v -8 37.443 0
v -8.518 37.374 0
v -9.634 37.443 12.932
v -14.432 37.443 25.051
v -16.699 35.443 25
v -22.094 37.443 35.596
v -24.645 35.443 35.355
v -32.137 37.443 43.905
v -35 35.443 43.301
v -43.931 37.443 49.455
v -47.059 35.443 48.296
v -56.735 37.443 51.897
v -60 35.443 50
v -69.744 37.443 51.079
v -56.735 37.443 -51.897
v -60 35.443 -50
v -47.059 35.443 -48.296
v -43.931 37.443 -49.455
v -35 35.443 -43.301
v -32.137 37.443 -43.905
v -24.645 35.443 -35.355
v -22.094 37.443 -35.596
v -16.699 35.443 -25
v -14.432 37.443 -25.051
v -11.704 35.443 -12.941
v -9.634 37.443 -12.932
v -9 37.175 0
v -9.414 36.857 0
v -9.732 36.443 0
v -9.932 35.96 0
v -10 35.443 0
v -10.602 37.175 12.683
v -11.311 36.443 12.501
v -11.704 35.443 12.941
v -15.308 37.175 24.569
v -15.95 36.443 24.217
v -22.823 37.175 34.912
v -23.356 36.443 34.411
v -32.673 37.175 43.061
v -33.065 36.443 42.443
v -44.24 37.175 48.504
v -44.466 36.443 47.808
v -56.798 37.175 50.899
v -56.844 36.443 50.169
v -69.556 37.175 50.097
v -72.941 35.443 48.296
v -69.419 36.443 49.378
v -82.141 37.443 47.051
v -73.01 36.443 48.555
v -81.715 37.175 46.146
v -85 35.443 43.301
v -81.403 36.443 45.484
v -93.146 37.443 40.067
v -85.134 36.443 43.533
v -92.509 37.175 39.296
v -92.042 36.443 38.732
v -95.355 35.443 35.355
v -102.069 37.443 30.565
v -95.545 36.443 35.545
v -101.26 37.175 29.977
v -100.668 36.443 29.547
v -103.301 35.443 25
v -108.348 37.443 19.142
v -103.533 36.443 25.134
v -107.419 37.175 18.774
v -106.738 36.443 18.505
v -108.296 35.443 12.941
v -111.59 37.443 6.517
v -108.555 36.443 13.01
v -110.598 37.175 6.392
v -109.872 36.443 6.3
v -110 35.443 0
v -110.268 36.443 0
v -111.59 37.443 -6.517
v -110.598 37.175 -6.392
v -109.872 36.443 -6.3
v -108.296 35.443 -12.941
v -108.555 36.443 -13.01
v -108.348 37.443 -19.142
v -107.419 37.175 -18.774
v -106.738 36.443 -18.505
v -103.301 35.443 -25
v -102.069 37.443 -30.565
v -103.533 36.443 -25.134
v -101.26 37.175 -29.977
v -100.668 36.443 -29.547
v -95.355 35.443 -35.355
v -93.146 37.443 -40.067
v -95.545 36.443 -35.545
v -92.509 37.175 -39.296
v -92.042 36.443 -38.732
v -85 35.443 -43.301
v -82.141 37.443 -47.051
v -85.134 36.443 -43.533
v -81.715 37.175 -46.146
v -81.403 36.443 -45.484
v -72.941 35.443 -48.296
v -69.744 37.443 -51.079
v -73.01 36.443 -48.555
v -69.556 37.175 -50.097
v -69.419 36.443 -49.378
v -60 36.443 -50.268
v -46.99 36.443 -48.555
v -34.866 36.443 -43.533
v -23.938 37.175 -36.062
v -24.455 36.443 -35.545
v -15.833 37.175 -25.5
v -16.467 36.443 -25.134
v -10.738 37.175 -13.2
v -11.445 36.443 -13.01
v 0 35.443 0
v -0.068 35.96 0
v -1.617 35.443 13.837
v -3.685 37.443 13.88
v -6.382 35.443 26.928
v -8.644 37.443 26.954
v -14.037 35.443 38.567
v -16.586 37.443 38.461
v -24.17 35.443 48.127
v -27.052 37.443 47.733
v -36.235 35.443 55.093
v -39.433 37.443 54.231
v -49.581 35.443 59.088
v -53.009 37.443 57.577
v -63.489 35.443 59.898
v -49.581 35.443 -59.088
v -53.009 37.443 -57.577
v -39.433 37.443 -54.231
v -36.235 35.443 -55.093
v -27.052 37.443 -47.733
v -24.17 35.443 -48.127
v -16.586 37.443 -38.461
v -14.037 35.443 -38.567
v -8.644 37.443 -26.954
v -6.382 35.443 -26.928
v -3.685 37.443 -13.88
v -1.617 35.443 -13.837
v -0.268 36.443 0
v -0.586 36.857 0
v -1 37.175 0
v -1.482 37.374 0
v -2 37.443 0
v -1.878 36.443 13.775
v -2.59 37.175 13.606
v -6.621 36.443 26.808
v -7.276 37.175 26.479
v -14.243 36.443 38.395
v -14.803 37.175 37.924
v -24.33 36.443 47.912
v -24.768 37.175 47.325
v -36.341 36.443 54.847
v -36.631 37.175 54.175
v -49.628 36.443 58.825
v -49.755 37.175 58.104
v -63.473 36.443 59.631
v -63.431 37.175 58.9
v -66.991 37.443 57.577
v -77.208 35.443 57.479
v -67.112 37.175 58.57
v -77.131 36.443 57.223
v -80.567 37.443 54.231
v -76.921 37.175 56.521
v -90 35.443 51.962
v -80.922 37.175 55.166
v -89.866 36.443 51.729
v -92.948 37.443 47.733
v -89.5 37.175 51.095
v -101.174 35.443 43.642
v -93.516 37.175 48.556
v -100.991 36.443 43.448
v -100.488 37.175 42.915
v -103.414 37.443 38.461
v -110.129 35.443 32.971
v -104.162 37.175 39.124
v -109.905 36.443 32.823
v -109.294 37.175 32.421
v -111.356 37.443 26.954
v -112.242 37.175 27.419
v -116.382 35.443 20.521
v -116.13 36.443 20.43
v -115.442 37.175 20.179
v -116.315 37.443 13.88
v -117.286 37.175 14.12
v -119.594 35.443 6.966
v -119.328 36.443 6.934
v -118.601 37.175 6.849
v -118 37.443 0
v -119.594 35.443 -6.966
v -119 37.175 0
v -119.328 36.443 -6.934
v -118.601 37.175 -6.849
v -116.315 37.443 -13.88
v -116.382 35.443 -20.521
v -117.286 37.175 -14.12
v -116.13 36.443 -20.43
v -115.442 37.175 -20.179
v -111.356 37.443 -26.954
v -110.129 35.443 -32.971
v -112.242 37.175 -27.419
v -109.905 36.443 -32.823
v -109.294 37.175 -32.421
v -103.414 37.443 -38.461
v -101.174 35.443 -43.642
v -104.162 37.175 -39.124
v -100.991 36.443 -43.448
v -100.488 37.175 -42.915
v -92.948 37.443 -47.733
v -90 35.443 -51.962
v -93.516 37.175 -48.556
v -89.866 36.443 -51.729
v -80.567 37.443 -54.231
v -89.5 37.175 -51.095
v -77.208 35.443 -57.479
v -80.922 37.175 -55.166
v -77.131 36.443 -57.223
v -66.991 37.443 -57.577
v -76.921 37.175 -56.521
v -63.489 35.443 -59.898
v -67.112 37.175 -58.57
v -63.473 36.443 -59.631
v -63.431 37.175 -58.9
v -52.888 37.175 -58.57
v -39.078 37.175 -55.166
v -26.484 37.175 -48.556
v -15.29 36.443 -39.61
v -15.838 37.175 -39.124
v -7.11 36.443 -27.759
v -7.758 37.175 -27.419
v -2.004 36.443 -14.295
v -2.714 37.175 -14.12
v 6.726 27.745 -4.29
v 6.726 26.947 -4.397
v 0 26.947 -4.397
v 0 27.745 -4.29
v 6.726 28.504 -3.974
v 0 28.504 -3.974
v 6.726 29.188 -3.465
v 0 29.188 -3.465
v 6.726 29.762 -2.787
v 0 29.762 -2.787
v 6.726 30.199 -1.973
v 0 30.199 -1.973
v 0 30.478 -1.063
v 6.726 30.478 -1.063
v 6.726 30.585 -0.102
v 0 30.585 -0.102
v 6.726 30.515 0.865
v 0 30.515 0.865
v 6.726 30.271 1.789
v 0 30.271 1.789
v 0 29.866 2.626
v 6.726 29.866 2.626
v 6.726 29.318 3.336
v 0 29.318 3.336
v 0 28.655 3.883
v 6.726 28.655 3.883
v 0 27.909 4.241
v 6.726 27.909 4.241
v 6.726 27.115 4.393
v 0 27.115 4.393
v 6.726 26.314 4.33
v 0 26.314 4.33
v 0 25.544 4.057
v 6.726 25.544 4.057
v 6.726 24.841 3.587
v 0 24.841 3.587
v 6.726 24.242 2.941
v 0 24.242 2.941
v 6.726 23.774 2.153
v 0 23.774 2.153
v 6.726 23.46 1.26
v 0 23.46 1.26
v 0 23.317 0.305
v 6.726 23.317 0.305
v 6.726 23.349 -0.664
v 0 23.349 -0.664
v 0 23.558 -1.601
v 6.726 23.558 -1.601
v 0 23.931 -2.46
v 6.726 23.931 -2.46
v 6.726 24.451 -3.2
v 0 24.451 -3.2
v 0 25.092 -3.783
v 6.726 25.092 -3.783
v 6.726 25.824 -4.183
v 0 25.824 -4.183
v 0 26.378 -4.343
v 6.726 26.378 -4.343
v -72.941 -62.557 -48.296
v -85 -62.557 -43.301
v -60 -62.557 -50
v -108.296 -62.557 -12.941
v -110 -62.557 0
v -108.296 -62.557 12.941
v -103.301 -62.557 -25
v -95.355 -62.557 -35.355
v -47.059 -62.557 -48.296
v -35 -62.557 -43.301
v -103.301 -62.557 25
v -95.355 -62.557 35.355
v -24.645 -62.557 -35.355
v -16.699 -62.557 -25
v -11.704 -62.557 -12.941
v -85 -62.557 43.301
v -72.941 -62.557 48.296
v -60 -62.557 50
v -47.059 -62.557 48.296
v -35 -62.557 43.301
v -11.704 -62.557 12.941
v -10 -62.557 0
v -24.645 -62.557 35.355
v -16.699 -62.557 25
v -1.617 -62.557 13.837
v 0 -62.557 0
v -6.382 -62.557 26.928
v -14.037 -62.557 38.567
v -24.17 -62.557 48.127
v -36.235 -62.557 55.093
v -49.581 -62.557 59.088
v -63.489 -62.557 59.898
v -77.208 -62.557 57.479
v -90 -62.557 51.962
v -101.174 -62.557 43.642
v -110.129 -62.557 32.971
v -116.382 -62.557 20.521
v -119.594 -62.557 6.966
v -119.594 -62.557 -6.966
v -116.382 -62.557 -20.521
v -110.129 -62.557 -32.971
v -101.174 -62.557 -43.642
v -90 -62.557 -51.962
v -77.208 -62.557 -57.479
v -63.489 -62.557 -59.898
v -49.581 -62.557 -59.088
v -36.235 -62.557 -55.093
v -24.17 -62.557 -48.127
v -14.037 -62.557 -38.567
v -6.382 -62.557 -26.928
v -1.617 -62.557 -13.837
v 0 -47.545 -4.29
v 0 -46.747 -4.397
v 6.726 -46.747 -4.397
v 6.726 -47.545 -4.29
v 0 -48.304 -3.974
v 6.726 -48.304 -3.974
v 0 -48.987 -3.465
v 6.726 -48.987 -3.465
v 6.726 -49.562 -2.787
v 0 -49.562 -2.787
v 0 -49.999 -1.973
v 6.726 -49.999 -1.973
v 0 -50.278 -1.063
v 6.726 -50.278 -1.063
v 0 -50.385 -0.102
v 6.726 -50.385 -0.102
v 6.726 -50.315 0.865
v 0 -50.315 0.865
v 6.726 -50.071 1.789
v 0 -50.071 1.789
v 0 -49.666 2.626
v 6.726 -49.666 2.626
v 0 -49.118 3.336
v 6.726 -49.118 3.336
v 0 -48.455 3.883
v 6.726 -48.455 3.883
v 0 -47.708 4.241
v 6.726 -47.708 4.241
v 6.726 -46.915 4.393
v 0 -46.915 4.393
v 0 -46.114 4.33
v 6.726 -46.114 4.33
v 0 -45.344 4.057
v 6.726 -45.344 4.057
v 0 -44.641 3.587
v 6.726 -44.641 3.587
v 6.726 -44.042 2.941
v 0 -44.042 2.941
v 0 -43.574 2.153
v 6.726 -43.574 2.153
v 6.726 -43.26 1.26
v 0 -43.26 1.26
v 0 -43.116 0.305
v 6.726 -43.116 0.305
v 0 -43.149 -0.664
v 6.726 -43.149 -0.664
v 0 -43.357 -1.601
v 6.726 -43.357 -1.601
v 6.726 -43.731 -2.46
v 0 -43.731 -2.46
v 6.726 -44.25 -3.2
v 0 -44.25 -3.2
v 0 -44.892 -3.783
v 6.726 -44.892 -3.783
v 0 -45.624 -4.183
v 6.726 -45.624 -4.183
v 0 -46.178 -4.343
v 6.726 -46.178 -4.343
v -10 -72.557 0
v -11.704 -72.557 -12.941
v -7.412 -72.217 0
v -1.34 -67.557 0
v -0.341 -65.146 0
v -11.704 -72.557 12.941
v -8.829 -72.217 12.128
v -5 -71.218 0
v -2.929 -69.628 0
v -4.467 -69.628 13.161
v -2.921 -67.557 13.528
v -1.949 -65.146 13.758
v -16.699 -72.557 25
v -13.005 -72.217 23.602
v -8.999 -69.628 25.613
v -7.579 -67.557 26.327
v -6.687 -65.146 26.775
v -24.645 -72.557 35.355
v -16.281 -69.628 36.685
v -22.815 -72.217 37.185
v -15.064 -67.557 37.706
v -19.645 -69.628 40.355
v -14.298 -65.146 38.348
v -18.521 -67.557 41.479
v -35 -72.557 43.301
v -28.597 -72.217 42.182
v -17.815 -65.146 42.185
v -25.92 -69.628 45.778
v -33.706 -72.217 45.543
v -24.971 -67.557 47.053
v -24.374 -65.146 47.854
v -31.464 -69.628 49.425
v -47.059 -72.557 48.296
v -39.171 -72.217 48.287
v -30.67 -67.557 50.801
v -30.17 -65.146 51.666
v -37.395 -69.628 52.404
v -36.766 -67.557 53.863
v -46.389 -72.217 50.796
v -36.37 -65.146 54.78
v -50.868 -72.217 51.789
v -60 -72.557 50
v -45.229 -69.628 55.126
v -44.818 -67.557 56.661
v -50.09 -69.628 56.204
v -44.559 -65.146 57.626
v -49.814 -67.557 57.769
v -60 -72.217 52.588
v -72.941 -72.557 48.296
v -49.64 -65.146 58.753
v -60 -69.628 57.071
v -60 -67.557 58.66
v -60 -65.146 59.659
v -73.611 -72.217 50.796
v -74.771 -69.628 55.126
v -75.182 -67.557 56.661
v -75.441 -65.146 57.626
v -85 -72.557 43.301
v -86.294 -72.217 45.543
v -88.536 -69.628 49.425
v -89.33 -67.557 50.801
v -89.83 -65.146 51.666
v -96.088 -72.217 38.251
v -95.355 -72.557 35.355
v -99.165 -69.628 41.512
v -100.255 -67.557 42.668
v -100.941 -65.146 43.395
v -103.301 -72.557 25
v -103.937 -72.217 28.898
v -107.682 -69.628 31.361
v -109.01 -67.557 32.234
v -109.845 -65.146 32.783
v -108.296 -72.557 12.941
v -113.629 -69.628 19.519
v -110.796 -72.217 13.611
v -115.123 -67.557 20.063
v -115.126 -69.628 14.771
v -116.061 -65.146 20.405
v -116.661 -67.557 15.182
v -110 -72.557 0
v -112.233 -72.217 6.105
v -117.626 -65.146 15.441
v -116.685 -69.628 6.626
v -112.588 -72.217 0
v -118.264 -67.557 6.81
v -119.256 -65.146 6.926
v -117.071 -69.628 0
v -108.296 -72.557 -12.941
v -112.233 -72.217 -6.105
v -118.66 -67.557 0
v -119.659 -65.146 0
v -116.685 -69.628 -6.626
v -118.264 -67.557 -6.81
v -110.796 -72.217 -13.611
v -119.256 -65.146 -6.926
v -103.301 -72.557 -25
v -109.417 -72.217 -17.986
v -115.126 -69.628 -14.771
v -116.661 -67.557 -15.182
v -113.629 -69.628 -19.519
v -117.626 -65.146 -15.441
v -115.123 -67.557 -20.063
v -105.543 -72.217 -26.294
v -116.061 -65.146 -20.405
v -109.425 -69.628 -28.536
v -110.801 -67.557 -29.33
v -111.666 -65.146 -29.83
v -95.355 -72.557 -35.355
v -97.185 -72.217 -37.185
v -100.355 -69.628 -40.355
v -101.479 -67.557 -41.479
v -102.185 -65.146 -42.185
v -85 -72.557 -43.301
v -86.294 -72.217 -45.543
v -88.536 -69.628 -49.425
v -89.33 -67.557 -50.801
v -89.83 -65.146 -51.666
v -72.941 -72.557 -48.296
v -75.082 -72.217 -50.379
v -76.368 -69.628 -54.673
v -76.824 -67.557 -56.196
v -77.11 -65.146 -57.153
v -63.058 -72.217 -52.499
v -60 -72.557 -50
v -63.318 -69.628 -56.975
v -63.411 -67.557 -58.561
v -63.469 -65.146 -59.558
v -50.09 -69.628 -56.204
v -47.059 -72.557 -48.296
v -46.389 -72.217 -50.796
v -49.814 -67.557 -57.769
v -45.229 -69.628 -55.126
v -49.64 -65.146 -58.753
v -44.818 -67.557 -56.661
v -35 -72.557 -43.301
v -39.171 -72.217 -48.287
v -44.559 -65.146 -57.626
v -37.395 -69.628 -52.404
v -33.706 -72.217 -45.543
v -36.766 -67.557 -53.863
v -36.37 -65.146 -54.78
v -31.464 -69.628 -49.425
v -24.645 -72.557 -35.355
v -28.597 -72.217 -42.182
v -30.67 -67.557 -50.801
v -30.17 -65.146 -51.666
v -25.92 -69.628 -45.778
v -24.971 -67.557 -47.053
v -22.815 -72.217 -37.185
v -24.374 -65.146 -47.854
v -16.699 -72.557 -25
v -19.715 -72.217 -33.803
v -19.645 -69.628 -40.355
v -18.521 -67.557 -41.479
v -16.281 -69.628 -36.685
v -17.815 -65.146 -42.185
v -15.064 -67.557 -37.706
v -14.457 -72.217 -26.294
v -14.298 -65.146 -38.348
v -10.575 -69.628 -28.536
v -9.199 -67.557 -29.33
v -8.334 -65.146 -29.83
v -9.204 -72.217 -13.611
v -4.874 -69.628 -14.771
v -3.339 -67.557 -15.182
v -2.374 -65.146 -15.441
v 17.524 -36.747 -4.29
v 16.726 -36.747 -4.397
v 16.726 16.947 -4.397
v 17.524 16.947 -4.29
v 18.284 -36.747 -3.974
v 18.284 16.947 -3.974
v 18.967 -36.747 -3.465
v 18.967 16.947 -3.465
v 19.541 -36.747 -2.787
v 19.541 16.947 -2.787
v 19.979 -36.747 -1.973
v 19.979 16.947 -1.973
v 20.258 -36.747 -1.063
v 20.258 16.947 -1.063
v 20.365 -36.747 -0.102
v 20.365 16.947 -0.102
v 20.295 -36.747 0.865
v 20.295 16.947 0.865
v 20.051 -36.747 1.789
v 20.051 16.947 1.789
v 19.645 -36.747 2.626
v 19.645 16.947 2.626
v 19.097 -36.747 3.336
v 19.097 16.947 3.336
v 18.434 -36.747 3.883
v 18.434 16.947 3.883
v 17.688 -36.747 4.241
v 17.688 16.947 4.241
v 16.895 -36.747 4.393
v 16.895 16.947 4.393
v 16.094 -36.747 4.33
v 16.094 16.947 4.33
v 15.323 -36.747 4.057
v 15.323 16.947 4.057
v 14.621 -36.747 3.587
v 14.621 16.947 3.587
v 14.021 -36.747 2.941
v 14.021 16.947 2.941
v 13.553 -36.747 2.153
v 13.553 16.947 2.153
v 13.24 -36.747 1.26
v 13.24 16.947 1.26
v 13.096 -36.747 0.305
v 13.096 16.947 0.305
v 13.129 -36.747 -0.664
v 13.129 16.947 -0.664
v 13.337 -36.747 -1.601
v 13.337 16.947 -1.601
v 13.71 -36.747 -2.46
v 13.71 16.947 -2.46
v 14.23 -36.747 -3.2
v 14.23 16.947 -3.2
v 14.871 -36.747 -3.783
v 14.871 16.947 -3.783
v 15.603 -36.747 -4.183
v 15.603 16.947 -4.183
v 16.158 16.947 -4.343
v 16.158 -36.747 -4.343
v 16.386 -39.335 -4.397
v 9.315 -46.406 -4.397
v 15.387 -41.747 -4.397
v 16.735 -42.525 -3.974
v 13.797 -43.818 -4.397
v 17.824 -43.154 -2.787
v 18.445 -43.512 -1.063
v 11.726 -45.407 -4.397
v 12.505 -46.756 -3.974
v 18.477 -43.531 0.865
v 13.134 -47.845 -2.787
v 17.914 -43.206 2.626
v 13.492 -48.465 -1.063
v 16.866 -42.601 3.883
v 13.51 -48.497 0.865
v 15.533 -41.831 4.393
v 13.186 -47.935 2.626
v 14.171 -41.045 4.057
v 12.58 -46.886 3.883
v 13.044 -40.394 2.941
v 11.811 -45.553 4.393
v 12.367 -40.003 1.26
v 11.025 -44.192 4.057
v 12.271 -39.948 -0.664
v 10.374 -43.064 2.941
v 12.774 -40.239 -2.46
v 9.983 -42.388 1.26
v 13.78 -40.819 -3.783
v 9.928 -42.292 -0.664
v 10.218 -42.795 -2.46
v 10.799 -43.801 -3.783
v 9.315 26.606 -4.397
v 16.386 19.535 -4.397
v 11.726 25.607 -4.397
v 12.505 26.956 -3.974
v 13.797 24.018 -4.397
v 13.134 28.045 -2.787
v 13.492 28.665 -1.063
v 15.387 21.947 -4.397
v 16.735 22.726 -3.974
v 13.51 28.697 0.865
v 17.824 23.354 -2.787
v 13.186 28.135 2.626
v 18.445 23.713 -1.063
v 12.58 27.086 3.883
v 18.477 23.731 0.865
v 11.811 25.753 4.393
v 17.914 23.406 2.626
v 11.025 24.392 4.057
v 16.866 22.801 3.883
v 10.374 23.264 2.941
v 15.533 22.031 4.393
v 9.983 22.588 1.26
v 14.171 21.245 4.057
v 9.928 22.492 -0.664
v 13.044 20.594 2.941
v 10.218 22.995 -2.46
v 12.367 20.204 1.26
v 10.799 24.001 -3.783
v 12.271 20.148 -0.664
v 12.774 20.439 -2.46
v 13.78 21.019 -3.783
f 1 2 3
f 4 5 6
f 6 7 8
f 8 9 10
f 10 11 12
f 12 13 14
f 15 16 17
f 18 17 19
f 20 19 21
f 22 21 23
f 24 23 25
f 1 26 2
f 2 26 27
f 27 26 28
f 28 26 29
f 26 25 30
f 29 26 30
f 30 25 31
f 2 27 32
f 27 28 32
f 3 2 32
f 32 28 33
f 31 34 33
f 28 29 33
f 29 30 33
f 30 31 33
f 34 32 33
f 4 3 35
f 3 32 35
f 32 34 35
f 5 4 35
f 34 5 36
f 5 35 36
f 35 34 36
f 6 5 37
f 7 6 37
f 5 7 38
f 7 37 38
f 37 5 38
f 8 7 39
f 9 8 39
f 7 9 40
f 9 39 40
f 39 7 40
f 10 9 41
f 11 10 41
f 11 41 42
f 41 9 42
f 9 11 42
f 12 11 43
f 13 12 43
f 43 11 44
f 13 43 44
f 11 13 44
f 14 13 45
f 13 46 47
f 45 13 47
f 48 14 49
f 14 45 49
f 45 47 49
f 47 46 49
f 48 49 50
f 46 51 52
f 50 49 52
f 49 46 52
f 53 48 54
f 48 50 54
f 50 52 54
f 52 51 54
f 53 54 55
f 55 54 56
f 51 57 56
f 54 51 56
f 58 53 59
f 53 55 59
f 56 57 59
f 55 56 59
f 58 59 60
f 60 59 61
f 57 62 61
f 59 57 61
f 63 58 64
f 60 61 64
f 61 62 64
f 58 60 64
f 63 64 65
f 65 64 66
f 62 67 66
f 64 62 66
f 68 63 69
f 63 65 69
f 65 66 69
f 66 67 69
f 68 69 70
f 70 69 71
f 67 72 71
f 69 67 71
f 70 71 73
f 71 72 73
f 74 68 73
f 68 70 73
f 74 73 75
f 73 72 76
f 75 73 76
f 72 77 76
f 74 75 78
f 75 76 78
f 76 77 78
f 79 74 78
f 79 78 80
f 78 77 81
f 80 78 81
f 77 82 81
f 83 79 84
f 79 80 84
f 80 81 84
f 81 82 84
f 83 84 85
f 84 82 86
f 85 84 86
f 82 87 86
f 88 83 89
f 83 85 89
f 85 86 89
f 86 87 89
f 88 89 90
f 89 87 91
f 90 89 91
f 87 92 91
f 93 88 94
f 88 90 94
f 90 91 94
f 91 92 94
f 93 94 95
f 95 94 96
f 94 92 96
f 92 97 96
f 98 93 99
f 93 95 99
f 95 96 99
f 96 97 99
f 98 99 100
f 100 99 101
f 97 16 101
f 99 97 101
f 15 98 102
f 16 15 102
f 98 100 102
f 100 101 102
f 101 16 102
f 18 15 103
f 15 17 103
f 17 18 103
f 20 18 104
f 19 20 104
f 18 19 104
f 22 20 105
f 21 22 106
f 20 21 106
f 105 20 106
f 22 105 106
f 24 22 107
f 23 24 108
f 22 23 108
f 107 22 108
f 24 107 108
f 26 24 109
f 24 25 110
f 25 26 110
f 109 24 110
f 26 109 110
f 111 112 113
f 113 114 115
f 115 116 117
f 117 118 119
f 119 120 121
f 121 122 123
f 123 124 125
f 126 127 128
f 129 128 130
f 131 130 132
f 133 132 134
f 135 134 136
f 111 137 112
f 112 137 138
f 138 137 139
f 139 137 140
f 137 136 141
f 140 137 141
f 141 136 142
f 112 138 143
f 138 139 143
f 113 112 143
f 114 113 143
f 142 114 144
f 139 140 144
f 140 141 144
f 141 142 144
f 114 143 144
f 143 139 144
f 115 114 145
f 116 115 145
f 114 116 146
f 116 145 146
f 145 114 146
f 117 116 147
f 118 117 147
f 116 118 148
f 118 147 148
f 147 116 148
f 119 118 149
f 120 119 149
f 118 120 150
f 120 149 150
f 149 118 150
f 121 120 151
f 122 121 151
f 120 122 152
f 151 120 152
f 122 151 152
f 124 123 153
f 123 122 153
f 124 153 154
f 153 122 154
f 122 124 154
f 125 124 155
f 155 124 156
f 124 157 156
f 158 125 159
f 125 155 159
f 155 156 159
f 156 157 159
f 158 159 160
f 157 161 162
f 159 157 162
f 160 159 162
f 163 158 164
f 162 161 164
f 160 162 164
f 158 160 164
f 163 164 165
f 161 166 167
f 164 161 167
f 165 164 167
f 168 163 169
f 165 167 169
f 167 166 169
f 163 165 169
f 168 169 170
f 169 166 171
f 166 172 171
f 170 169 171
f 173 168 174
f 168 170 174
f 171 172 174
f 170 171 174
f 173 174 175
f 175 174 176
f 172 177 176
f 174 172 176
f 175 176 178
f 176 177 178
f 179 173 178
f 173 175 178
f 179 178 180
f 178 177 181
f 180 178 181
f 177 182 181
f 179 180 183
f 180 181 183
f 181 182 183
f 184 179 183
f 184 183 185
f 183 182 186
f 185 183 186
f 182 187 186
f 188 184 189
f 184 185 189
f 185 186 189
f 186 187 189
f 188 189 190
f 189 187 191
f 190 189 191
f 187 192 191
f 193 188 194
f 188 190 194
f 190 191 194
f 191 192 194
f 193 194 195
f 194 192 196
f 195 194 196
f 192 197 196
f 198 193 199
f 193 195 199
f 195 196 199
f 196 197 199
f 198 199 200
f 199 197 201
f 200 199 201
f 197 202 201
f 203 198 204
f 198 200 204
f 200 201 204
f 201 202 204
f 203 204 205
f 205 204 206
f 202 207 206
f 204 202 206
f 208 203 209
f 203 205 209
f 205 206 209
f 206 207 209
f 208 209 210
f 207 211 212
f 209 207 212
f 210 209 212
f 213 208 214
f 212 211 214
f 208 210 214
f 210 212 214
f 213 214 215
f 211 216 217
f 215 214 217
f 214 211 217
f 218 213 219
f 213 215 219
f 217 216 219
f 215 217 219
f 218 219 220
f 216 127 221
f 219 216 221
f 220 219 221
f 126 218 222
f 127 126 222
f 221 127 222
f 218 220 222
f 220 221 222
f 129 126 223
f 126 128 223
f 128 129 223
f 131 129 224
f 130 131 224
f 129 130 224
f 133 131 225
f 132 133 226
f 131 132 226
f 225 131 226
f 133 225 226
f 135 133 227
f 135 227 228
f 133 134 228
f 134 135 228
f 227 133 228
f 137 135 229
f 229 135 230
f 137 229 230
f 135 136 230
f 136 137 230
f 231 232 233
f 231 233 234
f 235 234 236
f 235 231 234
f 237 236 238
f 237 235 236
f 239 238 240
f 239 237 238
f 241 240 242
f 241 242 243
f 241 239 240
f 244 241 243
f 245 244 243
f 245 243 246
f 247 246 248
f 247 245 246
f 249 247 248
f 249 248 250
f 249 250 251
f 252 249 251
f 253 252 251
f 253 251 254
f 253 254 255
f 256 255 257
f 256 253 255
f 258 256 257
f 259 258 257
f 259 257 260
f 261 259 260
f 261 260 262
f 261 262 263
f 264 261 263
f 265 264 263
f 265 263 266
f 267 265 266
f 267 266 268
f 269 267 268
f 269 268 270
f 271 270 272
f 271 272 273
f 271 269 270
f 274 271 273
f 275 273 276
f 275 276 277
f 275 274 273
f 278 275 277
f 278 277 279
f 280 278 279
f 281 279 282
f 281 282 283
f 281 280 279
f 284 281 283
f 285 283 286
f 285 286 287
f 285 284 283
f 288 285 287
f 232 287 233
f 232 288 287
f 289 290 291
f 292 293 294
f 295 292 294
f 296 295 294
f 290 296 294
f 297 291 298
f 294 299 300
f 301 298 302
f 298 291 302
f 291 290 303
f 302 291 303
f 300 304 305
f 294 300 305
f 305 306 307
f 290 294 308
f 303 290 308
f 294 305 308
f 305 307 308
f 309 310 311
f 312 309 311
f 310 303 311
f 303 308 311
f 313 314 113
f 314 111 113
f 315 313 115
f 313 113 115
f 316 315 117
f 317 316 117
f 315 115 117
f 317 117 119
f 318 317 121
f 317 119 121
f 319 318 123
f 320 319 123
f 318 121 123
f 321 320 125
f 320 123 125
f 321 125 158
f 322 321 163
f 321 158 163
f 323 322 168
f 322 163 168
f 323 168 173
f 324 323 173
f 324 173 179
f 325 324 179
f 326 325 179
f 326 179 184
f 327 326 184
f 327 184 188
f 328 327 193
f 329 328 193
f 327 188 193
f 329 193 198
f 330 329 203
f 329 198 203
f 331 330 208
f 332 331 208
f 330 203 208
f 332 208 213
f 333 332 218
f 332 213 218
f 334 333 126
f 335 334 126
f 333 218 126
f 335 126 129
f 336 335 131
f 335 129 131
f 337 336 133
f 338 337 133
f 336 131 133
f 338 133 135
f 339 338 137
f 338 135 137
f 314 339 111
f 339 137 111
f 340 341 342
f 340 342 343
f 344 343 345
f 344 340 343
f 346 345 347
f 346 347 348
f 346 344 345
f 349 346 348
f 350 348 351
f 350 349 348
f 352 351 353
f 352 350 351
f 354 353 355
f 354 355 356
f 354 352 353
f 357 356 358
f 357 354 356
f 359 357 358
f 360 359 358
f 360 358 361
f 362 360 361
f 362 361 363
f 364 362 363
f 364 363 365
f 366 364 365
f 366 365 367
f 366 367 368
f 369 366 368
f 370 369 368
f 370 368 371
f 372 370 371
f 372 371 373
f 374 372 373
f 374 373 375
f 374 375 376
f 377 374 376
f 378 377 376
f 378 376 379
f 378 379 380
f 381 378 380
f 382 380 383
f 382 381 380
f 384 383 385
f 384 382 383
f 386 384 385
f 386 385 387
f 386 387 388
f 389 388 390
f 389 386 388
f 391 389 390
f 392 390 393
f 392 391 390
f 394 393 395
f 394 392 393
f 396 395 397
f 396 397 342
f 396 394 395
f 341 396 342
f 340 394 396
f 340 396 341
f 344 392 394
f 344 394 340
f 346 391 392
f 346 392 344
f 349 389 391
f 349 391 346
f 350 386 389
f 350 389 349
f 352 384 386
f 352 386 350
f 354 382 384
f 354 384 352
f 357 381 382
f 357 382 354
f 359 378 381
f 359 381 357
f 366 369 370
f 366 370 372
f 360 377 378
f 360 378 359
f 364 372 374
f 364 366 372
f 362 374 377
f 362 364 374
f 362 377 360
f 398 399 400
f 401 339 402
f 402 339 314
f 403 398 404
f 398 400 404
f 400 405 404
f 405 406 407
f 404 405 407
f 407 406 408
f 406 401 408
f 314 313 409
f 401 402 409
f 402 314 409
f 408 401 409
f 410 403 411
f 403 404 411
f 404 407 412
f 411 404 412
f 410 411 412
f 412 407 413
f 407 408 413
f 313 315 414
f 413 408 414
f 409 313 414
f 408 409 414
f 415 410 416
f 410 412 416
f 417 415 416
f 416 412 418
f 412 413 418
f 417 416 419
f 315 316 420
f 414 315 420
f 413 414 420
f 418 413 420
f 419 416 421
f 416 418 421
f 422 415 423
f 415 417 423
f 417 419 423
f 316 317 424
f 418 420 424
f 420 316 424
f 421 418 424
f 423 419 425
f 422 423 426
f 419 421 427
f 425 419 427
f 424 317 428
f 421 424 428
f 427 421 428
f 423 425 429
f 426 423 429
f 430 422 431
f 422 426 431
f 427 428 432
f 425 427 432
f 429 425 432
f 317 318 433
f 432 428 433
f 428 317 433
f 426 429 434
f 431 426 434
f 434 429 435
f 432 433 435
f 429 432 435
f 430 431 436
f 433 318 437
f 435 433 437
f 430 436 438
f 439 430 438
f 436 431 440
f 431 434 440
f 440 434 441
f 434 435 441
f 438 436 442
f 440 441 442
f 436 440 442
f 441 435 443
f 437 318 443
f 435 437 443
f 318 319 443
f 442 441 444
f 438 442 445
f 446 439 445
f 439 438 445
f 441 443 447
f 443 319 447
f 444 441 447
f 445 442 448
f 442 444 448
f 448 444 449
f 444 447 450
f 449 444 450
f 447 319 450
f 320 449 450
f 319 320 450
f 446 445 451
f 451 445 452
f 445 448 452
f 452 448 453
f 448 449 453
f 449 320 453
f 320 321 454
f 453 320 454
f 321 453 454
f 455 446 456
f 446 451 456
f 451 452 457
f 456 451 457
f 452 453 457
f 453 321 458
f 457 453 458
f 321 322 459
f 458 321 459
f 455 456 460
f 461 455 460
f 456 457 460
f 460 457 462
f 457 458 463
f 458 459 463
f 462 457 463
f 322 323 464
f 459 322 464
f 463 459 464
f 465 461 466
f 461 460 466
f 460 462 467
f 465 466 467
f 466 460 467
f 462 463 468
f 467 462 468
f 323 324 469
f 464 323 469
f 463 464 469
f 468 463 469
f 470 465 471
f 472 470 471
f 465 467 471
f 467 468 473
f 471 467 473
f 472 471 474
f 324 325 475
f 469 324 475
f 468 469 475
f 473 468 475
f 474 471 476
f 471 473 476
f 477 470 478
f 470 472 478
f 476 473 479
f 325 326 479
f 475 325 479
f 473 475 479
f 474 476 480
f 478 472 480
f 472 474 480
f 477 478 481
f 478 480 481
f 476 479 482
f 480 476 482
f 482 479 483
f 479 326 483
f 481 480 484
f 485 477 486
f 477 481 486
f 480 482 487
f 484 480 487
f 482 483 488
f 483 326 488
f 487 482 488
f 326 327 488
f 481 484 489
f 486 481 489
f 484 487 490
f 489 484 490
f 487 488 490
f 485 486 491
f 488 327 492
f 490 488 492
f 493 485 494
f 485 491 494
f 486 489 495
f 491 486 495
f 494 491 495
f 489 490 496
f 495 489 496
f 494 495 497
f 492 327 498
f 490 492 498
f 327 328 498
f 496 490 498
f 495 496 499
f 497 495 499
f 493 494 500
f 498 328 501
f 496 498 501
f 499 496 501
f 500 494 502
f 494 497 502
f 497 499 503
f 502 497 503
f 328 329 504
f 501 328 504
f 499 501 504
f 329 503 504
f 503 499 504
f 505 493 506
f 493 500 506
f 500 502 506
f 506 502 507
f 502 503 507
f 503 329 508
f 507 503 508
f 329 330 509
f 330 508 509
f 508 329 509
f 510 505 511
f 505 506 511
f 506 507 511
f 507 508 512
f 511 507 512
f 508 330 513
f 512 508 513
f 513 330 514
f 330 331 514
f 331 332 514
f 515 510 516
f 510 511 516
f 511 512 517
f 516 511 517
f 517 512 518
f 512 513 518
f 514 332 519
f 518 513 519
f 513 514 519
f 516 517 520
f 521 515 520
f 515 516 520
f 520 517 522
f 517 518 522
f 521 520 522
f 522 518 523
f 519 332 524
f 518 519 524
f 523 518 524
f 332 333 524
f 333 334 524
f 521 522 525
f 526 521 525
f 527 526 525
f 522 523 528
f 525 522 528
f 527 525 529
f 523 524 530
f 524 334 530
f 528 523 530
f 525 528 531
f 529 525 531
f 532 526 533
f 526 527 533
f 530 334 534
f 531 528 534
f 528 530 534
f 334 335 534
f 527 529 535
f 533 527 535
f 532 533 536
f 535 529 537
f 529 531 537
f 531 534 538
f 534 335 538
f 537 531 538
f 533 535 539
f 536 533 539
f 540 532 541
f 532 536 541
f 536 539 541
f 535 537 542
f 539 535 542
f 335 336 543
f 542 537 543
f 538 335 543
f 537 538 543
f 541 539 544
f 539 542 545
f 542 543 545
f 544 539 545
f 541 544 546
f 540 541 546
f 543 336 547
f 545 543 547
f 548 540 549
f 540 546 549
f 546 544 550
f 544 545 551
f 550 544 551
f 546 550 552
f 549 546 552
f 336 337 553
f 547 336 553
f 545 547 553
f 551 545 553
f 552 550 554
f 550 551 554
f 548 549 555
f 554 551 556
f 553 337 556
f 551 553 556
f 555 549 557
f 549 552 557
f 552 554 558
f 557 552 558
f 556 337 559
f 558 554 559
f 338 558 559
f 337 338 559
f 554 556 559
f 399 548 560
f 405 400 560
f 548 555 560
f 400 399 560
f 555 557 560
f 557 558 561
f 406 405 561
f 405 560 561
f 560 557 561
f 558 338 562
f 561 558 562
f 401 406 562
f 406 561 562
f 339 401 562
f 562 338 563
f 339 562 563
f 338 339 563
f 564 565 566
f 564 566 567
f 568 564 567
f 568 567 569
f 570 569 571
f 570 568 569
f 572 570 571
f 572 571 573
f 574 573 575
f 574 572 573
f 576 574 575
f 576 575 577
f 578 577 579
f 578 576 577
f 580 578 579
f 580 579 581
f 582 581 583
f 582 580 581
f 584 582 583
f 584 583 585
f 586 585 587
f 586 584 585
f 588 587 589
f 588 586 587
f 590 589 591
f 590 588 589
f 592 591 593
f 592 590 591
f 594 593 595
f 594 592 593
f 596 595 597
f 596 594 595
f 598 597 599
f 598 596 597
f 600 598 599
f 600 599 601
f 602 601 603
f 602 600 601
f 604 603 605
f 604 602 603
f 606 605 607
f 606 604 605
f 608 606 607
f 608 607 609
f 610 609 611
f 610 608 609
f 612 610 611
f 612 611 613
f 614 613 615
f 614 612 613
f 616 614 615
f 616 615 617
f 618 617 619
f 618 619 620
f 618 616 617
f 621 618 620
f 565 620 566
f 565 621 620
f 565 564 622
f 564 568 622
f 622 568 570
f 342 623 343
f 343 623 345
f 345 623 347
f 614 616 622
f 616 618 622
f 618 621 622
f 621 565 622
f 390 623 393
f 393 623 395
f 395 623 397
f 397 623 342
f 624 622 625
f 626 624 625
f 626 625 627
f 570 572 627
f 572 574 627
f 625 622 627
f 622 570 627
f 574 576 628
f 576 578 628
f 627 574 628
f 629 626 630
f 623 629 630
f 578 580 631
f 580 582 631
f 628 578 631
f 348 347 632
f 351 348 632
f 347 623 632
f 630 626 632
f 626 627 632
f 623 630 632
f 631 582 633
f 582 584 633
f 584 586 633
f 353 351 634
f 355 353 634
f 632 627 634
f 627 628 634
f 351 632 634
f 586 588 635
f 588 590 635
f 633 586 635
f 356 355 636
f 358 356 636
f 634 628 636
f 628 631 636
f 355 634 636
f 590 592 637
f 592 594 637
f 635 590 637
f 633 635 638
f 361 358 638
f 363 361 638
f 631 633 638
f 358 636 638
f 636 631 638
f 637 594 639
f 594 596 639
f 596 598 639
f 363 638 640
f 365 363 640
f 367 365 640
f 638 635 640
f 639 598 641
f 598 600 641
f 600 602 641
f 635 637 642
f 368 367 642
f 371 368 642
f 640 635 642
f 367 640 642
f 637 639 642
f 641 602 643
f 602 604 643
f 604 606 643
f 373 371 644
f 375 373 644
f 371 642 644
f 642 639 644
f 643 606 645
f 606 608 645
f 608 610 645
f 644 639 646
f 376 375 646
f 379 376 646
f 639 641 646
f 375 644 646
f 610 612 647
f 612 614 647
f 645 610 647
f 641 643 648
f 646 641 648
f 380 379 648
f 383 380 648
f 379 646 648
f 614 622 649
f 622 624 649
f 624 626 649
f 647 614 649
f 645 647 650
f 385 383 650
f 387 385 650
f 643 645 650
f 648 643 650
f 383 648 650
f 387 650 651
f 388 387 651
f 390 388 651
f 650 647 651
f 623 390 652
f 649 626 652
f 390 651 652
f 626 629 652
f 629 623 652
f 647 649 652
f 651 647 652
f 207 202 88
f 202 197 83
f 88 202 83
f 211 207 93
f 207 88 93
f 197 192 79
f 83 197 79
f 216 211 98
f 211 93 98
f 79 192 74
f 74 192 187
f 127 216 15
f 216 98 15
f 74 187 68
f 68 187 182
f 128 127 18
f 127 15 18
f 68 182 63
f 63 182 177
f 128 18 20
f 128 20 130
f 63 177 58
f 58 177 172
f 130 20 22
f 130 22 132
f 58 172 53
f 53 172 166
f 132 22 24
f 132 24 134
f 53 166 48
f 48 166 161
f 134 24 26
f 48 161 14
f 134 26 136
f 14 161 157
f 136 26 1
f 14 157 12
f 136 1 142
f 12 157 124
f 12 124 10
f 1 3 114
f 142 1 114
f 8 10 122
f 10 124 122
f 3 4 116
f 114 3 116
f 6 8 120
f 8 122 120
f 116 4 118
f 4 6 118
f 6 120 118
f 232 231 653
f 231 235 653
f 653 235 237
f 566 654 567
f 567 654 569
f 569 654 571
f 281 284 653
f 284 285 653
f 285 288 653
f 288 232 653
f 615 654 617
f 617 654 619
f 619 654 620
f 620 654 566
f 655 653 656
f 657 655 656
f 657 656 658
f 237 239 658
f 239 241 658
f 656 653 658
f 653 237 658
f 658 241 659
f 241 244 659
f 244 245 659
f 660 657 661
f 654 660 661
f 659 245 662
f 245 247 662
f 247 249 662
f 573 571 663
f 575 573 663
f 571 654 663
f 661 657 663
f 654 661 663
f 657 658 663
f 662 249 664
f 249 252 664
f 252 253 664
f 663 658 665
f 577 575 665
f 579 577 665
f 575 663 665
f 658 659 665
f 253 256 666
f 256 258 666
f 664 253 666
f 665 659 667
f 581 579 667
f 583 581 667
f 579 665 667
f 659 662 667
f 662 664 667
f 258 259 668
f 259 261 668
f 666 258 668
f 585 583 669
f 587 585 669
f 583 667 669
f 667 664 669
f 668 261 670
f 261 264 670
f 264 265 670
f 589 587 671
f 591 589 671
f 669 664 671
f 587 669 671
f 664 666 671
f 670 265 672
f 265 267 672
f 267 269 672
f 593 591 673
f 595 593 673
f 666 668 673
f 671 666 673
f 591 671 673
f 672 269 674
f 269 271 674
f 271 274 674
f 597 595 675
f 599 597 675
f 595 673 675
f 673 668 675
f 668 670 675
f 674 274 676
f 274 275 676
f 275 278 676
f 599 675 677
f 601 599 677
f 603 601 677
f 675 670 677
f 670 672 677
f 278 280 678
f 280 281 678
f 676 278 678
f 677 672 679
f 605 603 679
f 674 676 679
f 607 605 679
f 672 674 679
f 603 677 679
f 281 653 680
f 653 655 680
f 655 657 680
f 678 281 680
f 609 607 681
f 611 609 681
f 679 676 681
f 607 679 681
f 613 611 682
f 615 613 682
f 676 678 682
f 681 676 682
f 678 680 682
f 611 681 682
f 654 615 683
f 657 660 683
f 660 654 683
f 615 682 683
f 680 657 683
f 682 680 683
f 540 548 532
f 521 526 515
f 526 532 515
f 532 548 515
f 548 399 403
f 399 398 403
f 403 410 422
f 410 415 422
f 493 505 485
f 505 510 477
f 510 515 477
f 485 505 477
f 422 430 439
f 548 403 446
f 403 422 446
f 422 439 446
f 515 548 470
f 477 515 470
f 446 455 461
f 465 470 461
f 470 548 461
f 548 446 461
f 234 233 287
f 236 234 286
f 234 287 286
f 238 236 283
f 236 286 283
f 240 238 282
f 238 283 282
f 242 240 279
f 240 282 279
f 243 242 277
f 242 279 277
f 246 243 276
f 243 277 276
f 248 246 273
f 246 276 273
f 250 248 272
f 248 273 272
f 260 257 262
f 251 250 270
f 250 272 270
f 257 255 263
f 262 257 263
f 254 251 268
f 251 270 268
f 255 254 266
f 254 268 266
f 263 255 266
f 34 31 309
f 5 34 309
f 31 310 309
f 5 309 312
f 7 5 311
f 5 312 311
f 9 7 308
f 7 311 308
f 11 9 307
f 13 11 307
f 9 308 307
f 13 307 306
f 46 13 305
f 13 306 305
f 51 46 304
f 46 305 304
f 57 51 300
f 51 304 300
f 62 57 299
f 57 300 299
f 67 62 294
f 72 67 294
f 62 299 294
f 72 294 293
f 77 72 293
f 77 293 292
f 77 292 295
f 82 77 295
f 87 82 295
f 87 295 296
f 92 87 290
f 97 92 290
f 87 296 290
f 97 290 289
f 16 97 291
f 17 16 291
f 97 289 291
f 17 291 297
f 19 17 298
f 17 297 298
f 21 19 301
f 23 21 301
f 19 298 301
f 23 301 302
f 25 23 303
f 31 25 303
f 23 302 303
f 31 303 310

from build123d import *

# Parameters (mm, degrees)
SKETCH8_RX = 4.397360636
SKETCH8_RY = 3.639195009


with BuildPart() as part:
    # Sketch6 → Revolve7 (revolve)
    with BuildSketch(Plane.XY):
        with BuildLine():
            Line((0, 0), (0, 35.442595339))
            ThreePointArc((0, 35.442595339), (-0.585786438, 36.856808901), (-2, 37.442595339))
            Line((-2, 37.442595339), (-8, 37.442595339))
            ThreePointArc((-8, 37.442595339), (-9.414213562, 36.856808901), (-10, 35.442595339))
            Line((-10, 35.442595339), (-10, -62.557404661))
            Line((-10, -62.557404661), (-60, -62.557404661))
            Line((-60, -62.557404661), (-60, -72.557404661))
            Line((-60, -72.557404661), (-10, -72.557404661))
            ThreePointArc((-10, -72.557404661), (-2.928932188, -69.628472473), (0, -62.557404661))
            Line((0, -62.557404661), (0, 0))
        make_face()
    revolve(axis=Axis((-60, 37.442595339, 0), (0, -1, 0)))


with BuildPart() as body_2:
    # Sweep4: sweep along a path in Sketch10
    with BuildLine(Plane.XY) as sweep4_path:
        Line((0, 26.946917637), (6.72636144, 26.946917637))
        ThreePointArc((6.72636144, 26.946917637), (13.797429252, 24.017985449), (16.72636144, 16.946917637))
        Line((16.72636144, 16.946917637), (16.72636144, -36.746781296))
        ThreePointArc((16.72636144, -36.746781296), (13.797429252, -43.817849108), (6.72636144, -46.746781296))
        Line((6.72636144, -46.746781296), (0, -46.746781296))
    # Sketch8 → Sweep4 (sweep)
    with BuildSketch(Plane(origin=(0, 0, 0), x_dir=(0, 0, -1), z_dir=(1, 0, 0))):
        with Locations((0, 26.946917637)):
            Ellipse(SKETCH8_RX, SKETCH8_RY)
    sweep(path=sweep4_path.line)


solid = Compound([part.part, body_2.part])
